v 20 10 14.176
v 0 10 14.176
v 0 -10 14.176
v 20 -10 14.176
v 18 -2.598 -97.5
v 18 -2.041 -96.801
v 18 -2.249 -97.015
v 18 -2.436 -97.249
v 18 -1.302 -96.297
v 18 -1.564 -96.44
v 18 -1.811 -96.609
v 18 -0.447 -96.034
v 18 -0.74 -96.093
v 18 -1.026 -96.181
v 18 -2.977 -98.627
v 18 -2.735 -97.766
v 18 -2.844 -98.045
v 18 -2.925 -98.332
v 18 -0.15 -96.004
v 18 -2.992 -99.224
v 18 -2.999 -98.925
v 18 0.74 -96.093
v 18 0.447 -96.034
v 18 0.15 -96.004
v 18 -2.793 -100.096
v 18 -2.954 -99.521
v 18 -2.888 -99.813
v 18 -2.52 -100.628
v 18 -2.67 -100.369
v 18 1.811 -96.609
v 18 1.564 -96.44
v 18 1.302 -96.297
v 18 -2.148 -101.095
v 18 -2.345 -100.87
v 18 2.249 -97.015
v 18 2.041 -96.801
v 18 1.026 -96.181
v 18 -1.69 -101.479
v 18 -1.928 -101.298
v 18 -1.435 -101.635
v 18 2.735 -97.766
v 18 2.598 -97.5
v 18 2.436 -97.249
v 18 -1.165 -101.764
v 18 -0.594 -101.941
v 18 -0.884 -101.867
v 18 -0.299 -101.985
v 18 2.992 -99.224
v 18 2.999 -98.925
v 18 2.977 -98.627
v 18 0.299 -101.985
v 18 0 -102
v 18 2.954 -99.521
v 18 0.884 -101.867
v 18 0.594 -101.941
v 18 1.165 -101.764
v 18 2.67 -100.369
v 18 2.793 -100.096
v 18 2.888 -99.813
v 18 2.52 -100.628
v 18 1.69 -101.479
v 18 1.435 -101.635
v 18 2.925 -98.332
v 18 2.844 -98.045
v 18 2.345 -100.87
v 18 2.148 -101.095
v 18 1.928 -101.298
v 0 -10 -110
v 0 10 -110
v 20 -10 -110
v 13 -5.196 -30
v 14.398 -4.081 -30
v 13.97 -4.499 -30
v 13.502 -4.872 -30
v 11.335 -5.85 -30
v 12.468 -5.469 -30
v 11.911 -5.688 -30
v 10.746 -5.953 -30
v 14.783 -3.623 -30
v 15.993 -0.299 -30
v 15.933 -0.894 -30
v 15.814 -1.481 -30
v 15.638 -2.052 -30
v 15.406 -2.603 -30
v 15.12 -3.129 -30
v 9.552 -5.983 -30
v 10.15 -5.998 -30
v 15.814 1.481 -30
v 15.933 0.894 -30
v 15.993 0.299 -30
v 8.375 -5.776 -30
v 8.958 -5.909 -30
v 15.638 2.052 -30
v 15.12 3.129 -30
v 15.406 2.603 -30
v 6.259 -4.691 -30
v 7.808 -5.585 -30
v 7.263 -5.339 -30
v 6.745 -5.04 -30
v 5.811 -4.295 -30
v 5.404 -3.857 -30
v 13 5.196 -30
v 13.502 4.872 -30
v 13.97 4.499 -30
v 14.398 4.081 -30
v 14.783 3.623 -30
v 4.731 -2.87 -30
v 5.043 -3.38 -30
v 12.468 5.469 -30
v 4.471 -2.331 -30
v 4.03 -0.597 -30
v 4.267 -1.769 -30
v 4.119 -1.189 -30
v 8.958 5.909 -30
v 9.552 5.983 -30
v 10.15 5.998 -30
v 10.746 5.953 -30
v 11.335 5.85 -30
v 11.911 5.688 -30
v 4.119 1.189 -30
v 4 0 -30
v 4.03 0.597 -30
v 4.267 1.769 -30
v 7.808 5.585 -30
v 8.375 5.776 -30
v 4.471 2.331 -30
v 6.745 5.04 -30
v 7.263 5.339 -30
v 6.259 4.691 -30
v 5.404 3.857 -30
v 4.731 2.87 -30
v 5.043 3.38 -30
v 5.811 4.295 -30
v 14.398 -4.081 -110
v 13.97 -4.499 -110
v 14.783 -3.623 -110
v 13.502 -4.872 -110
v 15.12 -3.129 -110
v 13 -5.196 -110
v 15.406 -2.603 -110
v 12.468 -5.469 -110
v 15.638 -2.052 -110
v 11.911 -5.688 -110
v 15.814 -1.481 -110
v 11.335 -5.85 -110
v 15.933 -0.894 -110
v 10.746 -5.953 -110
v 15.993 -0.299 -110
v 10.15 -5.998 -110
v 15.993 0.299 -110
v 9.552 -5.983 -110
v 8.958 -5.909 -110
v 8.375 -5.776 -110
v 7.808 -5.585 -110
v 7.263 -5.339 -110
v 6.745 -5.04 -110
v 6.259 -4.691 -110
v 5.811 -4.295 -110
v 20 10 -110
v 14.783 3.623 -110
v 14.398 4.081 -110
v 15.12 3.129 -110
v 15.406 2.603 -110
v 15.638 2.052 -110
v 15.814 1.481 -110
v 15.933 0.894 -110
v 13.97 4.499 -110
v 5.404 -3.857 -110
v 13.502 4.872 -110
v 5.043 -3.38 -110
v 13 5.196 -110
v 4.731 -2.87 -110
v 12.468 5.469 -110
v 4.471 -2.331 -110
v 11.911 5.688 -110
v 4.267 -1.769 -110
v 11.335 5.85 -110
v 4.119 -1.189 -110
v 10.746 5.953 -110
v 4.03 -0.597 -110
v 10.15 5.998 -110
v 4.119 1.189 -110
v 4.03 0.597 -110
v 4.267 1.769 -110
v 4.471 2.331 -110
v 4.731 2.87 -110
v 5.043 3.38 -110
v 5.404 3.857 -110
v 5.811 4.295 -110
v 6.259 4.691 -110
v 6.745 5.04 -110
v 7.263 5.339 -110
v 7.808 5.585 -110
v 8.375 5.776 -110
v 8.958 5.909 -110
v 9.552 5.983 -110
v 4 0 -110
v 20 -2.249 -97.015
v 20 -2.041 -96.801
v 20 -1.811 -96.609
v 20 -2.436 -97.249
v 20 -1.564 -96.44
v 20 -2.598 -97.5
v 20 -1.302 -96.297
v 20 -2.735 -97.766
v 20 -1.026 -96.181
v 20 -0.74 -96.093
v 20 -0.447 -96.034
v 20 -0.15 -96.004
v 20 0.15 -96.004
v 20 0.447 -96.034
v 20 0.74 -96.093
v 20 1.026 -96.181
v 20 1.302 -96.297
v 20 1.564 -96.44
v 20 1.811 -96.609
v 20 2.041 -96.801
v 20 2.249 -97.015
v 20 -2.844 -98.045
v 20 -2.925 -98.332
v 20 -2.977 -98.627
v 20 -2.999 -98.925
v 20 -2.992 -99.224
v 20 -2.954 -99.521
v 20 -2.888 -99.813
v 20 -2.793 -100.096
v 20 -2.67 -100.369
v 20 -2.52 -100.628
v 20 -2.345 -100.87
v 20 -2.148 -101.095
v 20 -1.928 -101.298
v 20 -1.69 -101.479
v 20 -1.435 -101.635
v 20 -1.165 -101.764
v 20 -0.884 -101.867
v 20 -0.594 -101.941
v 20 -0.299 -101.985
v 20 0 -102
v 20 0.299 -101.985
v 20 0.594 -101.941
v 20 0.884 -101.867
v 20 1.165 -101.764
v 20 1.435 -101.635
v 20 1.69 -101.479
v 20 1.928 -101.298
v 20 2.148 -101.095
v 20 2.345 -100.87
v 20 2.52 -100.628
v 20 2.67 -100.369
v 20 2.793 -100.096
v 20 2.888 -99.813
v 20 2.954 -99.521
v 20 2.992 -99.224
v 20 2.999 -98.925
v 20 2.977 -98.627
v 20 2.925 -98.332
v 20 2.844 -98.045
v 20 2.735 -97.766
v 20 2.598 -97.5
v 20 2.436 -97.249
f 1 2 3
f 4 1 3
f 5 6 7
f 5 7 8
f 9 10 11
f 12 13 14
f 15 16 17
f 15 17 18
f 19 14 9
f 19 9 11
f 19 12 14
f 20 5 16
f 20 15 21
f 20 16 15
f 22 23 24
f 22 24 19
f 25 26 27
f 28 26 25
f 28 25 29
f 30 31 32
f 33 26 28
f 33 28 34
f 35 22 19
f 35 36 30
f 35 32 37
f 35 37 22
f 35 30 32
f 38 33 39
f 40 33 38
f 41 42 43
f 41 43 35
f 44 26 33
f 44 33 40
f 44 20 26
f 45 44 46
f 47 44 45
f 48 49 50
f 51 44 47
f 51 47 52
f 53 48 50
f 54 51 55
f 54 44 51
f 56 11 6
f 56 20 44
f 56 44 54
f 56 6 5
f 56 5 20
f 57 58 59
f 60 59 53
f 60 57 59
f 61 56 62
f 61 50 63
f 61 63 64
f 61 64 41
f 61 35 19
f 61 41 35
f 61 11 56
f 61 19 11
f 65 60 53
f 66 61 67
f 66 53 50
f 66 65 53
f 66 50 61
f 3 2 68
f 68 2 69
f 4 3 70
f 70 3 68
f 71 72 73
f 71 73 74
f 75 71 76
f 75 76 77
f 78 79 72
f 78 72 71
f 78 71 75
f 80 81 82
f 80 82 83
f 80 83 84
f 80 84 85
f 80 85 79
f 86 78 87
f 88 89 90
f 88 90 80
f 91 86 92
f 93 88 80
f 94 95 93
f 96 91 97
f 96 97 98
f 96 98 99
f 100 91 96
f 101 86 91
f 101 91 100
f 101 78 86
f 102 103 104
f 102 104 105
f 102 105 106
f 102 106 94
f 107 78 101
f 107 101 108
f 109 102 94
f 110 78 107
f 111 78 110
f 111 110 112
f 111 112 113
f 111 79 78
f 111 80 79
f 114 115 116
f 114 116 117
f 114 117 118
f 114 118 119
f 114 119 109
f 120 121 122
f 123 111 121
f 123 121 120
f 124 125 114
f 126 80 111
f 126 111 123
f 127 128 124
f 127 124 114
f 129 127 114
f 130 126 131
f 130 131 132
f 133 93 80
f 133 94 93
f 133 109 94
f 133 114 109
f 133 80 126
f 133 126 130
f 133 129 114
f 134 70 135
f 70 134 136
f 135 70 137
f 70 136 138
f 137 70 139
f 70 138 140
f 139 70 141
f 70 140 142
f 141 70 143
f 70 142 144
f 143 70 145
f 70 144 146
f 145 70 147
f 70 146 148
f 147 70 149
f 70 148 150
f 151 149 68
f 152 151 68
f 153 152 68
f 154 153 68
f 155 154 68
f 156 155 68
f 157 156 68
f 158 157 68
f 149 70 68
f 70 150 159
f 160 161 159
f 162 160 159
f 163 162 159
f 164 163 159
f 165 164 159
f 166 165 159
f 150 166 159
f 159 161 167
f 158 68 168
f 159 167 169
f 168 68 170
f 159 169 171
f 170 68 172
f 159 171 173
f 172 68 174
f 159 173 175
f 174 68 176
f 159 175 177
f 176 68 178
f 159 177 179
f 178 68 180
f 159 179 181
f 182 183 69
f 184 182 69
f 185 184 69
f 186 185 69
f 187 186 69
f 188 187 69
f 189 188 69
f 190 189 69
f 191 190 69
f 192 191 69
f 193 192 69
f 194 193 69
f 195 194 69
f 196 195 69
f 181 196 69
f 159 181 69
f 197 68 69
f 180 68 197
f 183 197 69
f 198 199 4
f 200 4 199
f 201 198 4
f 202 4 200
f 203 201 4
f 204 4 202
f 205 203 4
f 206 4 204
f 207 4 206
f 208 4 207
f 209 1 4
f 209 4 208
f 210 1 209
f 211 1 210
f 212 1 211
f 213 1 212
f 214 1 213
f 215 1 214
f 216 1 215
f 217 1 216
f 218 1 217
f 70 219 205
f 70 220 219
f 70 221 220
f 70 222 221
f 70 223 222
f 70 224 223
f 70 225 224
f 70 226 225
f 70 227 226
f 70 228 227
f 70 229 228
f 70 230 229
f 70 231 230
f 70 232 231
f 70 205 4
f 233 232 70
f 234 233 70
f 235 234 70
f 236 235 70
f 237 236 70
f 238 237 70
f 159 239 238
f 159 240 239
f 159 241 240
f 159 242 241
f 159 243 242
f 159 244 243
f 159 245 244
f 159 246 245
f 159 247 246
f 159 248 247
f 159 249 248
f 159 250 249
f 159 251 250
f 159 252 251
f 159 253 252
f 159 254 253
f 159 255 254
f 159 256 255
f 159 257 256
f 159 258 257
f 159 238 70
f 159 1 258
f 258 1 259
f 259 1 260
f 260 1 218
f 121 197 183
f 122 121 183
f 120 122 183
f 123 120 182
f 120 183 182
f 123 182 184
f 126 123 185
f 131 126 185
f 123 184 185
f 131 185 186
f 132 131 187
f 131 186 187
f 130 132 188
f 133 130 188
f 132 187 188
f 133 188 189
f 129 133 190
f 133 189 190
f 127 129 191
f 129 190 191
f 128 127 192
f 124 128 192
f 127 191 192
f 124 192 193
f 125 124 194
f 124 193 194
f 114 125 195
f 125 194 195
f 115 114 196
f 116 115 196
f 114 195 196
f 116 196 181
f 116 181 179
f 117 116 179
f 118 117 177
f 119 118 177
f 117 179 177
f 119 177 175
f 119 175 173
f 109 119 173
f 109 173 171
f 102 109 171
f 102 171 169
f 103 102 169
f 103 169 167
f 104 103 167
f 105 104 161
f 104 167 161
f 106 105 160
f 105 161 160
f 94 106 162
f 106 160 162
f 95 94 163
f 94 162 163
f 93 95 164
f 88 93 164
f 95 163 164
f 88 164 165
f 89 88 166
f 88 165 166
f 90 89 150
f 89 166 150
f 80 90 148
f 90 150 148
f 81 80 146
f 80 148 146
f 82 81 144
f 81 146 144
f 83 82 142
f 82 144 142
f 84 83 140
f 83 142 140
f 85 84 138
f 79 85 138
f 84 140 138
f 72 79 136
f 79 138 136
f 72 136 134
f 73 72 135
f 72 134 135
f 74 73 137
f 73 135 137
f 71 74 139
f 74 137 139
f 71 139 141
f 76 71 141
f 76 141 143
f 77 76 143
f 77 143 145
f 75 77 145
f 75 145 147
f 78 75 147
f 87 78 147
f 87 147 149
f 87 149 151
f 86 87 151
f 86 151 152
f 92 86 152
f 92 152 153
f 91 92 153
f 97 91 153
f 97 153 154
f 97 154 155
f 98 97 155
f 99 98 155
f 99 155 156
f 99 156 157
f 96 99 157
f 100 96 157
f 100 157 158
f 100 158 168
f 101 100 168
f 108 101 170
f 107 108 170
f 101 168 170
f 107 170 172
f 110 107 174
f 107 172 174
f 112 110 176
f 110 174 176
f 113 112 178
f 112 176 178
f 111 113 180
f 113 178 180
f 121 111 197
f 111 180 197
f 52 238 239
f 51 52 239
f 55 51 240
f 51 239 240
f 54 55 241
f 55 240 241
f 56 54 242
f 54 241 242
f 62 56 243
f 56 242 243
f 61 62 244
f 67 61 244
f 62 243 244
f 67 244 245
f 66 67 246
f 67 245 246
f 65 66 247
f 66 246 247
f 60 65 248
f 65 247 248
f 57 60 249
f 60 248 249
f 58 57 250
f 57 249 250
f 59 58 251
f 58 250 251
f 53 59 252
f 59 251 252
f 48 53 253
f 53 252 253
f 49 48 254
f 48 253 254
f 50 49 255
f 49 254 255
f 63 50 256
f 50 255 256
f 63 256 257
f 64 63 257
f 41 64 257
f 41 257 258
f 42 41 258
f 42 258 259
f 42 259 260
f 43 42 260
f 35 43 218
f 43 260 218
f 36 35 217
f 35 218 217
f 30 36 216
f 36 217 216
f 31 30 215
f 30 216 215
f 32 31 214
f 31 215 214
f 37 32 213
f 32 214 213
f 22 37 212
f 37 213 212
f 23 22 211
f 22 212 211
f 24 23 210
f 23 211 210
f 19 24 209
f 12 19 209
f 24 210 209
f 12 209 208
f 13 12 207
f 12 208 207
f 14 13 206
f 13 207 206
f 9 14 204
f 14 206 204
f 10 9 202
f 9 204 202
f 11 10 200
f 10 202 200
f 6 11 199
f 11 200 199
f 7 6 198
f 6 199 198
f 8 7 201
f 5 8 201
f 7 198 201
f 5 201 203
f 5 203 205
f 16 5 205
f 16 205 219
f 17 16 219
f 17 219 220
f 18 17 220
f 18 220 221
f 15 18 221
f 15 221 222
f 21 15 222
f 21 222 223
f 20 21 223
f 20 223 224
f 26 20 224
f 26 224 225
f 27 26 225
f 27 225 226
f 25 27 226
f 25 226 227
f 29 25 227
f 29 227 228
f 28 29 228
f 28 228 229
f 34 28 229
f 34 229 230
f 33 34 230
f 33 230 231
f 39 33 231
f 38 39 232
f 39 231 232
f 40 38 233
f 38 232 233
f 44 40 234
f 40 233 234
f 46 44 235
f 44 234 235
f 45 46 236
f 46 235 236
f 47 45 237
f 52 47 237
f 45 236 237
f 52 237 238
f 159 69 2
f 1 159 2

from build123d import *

# Parameters (mm, degrees)
EXTRUDE_1_DEPTH     = 20
SKETCH_2_R          = 6
CUT_EXTRUDE_1_DEPTH = 80
SKETCH_3_R          = 3
CUT_EXTRUDE_2_DEPTH = 2


with BuildPart() as part:
    # 草图1 → 凸台-拉伸1 (new body)
    with BuildSketch(Plane(origin=(0, 0, 0), x_dir=(0, 0, -1), z_dir=(1, 0, 0))):
        Polygon((-14.17593604, 10), (-14.175953417, -10), (110, -10), (110, 10), align=None)
    extrude(amount=EXTRUDE_1_DEPTH)

    # 草图2 → 切除-拉伸1 (cut)
    with BuildSketch(Plane(origin=(0, 0, -110), x_dir=(-1, 0, 0), z_dir=(0, 0, -1))):
        with Locations((-10, 0)):
            Circle(SKETCH_2_R)
    extrude(amount=-CUT_EXTRUDE_1_DEPTH, mode=Mode.SUBTRACT)

    # 草图3 → 切除-拉伸2 (cut)
    with BuildSketch(Plane(origin=(20, 0, 0), x_dir=(0, 0, -1), z_dir=(1, 0, 0))):
        with Locations((99, 0)):
            Circle(SKETCH_3_R)
    extrude(amount=-CUT_EXTRUDE_2_DEPTH, mode=Mode.SUBTRACT)


solid = part.part
